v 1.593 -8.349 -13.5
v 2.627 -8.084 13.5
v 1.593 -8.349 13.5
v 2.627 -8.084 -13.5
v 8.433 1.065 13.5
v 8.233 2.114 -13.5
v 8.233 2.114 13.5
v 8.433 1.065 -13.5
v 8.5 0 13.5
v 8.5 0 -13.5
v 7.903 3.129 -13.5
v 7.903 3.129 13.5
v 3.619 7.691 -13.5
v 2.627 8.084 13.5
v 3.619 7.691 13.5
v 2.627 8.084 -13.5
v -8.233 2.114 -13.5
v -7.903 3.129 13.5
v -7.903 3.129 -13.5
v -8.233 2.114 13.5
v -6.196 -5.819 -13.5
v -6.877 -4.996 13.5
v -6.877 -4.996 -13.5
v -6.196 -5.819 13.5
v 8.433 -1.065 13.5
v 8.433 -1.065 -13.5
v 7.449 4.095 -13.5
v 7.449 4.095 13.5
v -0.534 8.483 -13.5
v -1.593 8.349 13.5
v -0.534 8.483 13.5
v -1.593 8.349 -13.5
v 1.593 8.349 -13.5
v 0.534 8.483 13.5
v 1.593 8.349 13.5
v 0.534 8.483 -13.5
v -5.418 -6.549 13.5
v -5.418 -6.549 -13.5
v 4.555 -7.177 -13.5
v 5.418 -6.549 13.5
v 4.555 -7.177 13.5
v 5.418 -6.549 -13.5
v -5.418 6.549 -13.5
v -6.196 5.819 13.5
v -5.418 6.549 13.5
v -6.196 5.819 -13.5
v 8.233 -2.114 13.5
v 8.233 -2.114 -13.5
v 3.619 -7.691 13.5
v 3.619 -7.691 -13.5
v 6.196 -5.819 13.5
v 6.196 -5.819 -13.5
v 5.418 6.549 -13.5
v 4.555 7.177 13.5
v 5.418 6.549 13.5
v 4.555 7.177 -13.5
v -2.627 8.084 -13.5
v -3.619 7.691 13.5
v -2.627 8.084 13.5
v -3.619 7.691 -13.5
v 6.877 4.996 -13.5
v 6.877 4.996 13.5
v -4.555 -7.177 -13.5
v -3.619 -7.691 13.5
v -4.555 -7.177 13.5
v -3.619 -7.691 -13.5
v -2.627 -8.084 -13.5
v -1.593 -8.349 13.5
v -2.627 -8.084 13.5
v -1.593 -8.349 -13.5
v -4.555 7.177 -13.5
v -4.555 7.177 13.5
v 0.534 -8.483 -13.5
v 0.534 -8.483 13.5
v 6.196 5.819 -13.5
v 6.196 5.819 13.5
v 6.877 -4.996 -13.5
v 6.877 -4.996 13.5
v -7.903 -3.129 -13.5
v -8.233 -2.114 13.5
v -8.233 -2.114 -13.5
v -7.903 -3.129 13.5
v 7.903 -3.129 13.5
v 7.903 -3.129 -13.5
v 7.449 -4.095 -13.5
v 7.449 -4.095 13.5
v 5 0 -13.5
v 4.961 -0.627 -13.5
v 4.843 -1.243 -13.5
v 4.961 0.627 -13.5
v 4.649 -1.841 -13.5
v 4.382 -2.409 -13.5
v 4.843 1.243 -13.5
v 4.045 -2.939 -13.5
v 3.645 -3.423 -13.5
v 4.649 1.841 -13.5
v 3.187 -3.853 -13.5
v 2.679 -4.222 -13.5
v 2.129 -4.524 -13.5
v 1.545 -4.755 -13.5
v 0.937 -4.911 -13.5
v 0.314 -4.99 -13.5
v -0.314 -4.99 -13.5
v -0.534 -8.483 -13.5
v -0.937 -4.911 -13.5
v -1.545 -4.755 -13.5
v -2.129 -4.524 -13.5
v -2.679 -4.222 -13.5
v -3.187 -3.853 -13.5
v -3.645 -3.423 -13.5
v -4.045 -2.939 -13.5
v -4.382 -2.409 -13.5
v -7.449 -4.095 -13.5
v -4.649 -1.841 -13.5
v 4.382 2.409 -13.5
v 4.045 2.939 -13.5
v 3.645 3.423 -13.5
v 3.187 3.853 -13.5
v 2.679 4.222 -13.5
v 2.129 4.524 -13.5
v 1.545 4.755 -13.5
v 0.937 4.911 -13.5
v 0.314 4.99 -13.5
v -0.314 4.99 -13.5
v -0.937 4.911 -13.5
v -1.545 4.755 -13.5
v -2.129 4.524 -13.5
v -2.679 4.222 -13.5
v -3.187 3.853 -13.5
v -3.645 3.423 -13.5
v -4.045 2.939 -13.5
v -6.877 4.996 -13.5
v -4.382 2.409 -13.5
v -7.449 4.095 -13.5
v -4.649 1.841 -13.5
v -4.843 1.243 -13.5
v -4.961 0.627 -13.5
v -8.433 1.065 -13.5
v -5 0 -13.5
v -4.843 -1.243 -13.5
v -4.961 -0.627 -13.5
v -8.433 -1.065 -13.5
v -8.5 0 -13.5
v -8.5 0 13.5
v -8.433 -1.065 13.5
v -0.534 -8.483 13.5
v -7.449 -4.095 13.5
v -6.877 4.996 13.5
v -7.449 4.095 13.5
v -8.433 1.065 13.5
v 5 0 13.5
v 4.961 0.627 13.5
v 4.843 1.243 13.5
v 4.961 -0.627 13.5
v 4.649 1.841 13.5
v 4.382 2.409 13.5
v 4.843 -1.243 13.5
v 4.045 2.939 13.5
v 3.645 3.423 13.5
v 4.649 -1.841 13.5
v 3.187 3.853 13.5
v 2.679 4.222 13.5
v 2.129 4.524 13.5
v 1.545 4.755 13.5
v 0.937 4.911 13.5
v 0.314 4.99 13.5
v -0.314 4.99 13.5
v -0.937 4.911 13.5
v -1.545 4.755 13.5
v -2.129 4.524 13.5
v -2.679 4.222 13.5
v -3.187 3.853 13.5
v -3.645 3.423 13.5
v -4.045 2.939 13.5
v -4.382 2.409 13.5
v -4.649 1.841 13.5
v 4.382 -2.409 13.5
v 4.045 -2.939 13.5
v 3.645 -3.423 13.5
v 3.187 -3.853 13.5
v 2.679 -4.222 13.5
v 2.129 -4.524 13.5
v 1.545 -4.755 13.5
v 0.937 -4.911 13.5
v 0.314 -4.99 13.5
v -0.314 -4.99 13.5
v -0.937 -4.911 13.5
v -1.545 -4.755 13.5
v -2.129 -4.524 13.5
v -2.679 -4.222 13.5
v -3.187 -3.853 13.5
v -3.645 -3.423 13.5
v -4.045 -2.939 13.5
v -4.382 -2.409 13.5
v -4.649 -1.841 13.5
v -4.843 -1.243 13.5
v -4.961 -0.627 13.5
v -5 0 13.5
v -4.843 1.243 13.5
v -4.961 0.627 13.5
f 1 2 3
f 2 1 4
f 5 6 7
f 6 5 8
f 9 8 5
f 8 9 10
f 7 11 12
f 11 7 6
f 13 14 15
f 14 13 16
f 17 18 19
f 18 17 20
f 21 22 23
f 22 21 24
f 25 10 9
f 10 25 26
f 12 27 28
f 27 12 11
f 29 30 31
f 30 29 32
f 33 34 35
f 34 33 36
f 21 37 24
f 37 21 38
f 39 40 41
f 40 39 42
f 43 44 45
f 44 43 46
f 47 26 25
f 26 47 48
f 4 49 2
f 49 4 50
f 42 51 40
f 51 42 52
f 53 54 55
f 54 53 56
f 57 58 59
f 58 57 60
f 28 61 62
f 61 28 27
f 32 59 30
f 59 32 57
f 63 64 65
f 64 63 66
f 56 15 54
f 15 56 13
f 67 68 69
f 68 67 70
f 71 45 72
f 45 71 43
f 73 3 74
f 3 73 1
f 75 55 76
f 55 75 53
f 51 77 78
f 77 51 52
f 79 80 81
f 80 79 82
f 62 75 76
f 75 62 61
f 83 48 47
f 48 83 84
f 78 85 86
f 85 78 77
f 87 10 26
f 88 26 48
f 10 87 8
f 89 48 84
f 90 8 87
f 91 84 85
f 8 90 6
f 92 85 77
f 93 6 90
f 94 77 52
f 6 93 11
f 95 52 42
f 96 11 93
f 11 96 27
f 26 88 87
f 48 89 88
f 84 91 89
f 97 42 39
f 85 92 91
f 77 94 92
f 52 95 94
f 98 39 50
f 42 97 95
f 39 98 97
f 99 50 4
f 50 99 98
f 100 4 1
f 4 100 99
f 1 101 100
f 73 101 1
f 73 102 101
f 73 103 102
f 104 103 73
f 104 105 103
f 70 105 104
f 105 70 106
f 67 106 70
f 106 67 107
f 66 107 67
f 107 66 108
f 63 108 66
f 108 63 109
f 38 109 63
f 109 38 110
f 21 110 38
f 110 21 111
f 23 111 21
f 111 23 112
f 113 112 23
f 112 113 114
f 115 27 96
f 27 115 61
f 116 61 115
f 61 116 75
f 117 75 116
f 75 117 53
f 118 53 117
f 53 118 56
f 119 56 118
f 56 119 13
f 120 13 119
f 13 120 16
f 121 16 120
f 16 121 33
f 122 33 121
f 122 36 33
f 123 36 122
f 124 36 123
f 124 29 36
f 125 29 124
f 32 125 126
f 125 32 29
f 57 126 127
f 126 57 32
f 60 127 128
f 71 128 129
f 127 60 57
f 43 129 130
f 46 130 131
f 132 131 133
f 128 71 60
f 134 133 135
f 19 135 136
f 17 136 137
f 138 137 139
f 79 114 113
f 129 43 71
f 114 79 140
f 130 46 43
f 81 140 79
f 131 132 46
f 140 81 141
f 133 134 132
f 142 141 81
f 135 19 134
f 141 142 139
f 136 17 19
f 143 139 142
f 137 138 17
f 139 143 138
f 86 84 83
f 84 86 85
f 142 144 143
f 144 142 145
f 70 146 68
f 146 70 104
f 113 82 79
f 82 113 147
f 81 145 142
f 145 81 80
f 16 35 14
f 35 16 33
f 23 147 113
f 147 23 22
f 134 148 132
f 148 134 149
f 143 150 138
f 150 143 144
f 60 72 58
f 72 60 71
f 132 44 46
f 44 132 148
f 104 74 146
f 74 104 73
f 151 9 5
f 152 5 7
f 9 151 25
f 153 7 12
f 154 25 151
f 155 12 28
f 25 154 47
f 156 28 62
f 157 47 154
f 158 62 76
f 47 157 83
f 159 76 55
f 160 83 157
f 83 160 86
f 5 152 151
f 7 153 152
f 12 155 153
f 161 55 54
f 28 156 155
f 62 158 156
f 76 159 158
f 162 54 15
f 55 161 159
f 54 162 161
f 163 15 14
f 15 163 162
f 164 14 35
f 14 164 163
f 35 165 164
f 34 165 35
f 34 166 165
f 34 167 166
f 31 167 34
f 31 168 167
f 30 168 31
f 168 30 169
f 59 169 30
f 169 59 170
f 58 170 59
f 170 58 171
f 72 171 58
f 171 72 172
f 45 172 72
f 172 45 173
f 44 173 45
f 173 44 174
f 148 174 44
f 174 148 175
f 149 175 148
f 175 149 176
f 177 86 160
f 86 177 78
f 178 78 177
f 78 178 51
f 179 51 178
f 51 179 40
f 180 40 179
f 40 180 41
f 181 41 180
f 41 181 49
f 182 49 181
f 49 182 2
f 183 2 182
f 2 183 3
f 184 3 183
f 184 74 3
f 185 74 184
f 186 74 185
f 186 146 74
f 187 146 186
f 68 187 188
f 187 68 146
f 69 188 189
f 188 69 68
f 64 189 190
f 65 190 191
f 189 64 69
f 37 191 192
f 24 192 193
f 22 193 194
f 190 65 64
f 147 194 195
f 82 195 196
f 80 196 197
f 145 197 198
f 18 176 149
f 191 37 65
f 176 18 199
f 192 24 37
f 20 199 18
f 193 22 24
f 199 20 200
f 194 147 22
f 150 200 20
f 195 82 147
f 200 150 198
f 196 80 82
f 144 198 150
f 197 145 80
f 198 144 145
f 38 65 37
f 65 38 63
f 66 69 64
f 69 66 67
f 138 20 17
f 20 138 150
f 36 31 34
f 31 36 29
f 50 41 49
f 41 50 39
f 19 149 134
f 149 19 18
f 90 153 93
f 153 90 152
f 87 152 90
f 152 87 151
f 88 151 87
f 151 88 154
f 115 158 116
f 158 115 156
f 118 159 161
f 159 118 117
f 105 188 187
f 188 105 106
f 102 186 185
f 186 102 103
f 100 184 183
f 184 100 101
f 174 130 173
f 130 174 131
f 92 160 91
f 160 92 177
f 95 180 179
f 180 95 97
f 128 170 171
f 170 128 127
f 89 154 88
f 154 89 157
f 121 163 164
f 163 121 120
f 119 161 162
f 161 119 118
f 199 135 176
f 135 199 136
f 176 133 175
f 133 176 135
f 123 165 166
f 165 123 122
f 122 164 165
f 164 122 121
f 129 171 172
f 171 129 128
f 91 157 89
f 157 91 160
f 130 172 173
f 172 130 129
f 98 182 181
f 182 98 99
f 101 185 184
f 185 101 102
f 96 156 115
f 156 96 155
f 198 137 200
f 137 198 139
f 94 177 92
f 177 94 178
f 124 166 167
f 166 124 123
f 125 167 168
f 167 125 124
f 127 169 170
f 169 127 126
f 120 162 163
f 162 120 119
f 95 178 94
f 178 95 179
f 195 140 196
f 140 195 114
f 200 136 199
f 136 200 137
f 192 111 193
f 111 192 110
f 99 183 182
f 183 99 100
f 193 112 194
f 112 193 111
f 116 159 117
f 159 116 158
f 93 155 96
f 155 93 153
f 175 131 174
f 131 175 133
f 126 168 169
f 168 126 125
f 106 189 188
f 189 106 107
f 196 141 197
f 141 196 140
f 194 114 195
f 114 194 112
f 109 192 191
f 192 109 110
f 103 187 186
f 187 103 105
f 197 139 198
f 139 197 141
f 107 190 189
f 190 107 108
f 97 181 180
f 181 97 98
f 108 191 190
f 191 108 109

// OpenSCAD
$fn = 50;


difference() {
	union() {
		translate(v = [0, 0, -13.5000000000]) {
			cylinder(h = 27, r = 8.5000000000);
		}
	}
	union() {
		translate(v = [0, 0, -100.0000000000]) {
			cylinder(h = 200, r = 5.0000000000);
		}
	}
}
